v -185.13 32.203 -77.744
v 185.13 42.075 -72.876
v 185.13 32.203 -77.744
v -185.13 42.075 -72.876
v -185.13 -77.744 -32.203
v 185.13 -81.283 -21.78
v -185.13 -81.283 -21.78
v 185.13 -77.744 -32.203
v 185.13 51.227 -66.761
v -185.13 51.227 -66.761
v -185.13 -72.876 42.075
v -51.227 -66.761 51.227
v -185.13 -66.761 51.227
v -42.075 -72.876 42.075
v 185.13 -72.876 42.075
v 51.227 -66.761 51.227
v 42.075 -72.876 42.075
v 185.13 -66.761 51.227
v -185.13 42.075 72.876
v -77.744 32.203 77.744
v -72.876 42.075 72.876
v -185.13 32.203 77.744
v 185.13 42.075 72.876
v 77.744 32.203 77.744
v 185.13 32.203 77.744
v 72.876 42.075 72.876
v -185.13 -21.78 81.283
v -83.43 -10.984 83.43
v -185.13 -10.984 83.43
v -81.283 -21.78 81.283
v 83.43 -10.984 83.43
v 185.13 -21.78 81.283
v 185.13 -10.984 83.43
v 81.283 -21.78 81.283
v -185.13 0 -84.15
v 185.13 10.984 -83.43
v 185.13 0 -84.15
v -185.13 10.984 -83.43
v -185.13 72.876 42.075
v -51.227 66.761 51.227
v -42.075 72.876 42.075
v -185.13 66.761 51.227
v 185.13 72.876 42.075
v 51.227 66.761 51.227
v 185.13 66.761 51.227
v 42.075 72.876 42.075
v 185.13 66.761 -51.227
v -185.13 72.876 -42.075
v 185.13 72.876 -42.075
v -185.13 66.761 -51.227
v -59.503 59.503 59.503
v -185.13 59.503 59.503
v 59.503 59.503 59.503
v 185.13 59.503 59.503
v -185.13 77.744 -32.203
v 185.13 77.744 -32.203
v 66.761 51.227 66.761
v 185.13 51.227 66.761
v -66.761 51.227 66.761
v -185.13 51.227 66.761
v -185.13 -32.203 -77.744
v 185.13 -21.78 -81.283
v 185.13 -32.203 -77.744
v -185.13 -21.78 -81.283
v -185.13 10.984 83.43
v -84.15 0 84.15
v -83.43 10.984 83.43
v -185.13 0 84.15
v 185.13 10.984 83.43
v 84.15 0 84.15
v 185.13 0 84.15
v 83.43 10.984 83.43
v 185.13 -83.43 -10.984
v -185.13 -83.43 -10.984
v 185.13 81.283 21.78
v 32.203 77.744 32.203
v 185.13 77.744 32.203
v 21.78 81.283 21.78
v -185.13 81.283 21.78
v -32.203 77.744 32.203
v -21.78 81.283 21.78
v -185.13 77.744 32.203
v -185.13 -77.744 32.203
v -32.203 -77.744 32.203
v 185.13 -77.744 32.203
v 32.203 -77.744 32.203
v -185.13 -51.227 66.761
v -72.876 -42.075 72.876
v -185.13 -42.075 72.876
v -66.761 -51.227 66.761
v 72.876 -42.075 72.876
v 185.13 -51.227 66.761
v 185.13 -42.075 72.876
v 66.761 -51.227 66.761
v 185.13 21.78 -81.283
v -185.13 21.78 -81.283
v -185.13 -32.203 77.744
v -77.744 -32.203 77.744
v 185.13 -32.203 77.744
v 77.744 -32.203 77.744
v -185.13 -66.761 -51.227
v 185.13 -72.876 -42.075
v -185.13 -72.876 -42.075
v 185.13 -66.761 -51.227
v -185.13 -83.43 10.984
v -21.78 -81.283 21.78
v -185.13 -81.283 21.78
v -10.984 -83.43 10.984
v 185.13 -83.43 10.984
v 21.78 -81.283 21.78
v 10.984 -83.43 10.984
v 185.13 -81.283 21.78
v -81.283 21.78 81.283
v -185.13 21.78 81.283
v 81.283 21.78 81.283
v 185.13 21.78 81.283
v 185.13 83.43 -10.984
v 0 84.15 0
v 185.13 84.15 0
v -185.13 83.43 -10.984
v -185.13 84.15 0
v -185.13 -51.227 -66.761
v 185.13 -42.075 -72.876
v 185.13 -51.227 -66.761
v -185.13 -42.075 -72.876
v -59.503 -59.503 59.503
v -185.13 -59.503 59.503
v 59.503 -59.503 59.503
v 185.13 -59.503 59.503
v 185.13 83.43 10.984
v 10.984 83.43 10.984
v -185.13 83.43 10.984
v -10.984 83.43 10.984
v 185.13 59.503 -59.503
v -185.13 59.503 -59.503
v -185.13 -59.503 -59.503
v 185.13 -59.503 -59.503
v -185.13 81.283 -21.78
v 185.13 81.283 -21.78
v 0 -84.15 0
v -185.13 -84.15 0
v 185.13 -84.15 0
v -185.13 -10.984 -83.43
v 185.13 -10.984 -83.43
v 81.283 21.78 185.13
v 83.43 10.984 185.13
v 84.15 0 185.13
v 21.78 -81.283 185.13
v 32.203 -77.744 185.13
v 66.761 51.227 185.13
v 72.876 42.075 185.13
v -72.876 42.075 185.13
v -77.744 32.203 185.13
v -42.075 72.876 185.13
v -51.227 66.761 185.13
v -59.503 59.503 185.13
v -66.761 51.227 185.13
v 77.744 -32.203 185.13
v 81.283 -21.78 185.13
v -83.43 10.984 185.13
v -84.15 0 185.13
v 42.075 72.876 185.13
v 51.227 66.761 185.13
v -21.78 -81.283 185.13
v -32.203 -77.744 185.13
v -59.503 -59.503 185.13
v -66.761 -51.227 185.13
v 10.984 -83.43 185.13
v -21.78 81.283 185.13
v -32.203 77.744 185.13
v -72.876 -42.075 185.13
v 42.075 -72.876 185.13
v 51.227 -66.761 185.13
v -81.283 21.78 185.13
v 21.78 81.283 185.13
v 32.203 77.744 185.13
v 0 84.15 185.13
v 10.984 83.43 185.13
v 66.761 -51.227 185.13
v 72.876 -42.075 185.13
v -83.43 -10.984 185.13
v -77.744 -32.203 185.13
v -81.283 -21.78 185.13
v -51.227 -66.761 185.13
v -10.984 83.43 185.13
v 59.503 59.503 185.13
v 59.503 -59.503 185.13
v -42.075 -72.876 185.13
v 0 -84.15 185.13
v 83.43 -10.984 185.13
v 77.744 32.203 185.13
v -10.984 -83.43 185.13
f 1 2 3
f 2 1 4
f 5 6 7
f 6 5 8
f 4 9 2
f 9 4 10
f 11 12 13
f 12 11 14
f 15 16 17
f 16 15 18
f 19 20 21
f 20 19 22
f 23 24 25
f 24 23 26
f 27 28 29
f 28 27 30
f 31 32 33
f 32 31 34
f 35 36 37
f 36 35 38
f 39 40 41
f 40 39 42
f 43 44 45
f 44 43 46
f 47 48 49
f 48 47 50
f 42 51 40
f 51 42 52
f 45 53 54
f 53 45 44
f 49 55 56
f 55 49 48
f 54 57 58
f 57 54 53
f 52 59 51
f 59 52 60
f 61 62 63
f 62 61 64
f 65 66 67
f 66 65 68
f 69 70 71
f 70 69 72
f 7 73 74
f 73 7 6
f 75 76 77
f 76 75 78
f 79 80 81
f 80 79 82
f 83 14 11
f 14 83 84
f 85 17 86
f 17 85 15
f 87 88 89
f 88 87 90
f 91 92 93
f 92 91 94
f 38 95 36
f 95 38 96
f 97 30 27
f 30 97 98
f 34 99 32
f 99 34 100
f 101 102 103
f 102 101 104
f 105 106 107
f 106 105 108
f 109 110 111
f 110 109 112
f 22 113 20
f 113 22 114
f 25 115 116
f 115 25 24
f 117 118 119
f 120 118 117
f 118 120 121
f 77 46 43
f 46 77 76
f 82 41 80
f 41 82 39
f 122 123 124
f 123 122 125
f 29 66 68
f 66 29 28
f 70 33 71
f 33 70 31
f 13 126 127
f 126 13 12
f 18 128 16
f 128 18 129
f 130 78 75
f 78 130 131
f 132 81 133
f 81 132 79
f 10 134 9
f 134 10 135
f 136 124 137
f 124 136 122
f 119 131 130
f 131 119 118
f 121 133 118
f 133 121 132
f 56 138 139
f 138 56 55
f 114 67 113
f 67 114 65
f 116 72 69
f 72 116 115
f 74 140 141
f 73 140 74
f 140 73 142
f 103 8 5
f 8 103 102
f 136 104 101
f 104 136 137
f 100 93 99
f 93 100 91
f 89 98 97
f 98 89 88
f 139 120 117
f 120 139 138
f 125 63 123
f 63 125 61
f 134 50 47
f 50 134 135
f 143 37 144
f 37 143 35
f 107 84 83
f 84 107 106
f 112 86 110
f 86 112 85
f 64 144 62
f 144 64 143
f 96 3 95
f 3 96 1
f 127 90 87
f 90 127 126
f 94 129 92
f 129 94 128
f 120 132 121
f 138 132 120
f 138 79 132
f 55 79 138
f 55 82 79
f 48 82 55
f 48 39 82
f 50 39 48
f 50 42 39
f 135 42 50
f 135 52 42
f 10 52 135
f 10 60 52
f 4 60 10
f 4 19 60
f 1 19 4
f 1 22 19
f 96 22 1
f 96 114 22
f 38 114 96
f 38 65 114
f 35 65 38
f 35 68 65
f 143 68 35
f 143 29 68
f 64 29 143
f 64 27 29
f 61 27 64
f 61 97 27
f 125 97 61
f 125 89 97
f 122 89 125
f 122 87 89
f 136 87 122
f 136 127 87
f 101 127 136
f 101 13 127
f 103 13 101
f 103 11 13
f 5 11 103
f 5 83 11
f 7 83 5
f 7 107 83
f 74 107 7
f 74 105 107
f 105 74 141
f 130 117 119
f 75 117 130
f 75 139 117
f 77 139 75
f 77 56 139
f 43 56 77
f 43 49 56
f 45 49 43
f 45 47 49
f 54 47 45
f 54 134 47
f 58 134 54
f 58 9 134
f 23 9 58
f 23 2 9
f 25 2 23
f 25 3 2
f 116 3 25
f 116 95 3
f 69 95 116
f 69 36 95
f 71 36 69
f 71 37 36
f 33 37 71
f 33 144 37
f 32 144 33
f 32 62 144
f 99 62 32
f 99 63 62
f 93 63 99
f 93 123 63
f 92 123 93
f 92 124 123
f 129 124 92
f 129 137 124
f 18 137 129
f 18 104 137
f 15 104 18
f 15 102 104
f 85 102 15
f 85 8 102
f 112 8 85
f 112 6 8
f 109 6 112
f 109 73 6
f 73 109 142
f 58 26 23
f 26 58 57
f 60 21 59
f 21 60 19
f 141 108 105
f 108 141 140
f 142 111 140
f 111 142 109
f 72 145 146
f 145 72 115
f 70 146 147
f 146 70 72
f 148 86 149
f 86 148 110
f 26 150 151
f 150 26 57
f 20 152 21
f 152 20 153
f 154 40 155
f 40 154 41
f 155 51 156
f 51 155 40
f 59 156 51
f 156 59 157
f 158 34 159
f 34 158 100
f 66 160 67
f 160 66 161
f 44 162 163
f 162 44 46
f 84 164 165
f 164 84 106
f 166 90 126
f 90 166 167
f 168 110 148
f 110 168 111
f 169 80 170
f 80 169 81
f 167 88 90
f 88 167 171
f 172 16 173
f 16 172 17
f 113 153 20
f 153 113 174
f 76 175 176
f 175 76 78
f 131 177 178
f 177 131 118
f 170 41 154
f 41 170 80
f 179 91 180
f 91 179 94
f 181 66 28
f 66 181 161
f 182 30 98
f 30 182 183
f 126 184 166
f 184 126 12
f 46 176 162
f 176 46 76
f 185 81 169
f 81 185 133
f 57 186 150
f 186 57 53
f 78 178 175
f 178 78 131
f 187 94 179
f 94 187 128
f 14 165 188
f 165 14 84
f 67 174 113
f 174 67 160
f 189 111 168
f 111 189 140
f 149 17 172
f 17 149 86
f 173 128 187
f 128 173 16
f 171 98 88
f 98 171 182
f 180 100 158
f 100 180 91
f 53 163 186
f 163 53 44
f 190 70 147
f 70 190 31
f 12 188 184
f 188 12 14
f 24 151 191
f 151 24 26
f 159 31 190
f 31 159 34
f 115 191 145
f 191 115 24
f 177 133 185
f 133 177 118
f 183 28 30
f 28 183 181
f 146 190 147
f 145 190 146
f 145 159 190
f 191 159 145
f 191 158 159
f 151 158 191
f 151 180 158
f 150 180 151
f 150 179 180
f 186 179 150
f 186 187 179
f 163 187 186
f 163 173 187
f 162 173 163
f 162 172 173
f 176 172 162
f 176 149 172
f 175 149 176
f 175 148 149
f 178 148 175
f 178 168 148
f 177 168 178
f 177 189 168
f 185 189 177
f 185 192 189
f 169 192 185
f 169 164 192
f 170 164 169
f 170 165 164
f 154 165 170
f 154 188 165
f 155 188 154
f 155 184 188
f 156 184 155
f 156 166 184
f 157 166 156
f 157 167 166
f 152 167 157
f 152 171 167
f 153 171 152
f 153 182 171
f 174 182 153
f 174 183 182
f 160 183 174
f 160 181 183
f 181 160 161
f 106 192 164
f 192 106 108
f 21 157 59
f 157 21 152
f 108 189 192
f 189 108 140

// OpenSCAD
// Auto-generated by scripts/author_from_manifest.py (Phase D.3).
// Source: data/phase_d_manifest.json (sku_intent='victaulic-no20-tee-grooved-6in').
// Do not hand-edit — regenerate from the manifest.
//
// @part victaulic_no20_tee_grooved_6in
// @kind fitting
// @category fitting.tee
// @display-name "Victaulic No. 20 Grooved Tee 6\""
// @mfg victaulic
// @mfg-pn No._20_6in
// @listing UL FM
// @price-usd 88.00
// @install-minutes 6
// @crew journeyman
// @param size_in number default=6 label="Size" unit="in"
// @port run_in position=[-0.05,0,0] direction=[-1,0,0] style=grooved size_in=6 role=run_a
// @port run_out position=[0.05,0,0] direction=[1,0,0] style=grooved size_in=6 role=run_b
// @port branch position=[0,0,0.05] direction=[0,0,1] style=grooved size_in=6 role=branch

size_in = 6.0;

function od_mm(nps) =
    nps ==   1  ? 33.4 :
    nps == 1.25 ? 42.2 :
    nps == 1.5  ? 48.3 :
    nps ==   2  ? 60.3 :
    nps == 2.5  ? 73.0 :
    nps ==   3  ? 88.9 :
    nps ==   4  ? 114.3 :
    nps ==   5  ? 141.3 :
    nps ==   6  ? 168.3 :
    nps ==   8  ? 219.1 :
    nps ==  10  ? 273.0 : 60.3;

od = od_mm(size_in);
run_len    = od * 2.2;
branch_len = od * 1.1;

union() {
    // Run along X
    rotate([0, 90, 0])
        cylinder(h = run_len, d = od, center = true, $fn = 48);
    // Branch along +Z
    translate([0, 0, branch_len/2])
        cylinder(h = branch_len, d = od, center = true, $fn = 48);
}
